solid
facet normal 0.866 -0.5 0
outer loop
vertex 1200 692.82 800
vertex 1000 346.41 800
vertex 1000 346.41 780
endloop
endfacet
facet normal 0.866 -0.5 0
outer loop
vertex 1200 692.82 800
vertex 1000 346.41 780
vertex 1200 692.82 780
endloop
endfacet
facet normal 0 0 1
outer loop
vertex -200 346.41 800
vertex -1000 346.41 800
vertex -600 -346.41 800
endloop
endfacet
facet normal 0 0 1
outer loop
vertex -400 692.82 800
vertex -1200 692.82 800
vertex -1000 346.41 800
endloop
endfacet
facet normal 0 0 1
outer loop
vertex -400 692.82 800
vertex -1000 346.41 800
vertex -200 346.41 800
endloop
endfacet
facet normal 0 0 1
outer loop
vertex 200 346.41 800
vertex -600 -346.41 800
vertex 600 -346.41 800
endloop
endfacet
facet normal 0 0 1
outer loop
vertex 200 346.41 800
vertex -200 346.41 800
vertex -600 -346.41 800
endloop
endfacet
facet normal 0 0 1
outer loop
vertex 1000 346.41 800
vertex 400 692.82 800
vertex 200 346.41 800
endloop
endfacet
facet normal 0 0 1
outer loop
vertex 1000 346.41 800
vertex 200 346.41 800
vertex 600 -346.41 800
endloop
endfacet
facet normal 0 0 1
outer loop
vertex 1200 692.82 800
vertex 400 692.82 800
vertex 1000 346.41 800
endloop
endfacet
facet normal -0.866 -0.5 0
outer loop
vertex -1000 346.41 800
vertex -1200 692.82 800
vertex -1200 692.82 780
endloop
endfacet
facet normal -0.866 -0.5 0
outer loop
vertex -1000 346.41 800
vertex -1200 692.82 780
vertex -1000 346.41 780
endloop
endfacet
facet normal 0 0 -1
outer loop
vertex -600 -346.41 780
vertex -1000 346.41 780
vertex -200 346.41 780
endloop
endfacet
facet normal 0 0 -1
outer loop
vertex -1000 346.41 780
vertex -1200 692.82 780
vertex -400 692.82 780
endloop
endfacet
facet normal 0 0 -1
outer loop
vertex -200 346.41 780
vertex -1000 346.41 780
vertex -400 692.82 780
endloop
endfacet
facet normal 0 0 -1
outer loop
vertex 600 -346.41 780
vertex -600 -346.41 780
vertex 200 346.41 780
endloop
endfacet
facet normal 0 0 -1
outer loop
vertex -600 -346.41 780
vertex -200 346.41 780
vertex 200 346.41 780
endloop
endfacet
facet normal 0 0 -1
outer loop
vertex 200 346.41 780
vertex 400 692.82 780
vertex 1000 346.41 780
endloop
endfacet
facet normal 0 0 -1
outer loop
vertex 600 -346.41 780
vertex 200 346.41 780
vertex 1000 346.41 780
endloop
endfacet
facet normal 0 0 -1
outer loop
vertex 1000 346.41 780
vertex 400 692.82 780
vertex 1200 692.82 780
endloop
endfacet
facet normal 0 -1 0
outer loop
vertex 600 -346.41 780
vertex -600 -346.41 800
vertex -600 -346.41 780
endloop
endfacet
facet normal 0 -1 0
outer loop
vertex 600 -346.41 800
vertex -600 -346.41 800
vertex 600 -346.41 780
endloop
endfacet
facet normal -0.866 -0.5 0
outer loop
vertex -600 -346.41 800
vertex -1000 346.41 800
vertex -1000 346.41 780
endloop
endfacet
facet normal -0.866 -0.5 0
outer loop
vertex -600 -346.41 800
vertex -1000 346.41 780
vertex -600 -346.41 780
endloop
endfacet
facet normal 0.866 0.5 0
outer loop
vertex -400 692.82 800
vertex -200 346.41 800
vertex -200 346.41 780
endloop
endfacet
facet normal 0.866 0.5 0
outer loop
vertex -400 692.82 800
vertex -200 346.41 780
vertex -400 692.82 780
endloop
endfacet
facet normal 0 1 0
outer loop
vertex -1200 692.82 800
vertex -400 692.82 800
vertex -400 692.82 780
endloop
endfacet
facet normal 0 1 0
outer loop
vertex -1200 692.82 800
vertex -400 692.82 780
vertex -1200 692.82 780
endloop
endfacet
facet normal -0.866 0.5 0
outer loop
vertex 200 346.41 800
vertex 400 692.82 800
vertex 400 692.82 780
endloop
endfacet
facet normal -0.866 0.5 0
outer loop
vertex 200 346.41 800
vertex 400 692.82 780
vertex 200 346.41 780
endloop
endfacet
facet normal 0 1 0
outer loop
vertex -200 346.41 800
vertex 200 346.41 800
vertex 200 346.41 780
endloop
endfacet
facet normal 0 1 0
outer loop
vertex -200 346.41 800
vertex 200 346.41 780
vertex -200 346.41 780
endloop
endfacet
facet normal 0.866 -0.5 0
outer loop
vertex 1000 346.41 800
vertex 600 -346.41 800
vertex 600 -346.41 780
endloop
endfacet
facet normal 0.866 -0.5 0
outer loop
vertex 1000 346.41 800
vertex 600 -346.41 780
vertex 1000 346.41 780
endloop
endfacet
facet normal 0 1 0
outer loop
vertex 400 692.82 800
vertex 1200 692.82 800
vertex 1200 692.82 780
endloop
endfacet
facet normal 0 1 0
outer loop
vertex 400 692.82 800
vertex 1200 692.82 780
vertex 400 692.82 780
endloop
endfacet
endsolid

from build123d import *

# Parameters (mm, degrees)
F2_DEPTH = 20


with BuildPart() as f2:
    # F1 (on offset) → F2 (new body)
    with BuildSketch(Plane.XY.offset(800)):
        Polygon((-200, 346.410162), (0, 0), (200, 346.410162), align=None)
        Polygon((-1000, 346.410162), (-600, 346.410162), (-800, 692.820323), align=None)
        Polygon((200, 346.410162), (0, 0), (400, 0), align=None)
        Polygon((-200, -346.410162), (0, 0), (-400, 0), align=None)
        Polygon((-800, 0), (-600, 346.410162), (-1000, 346.410162), align=None)
        Polygon((1200, 692.820323), (800, 692.820323), (1000, 346.410162), align=None)
        Polygon((-400, 0), (0, 0), (-200, 346.410162), align=None)
        Polygon((-1000, 346.410162), (-800, 692.820323), (-1200, 692.820323), align=None)
        Polygon((400, 692.820323), (200, 346.410162), (600, 346.410162), align=None)
        Polygon((800, 692.820323), (400, 692.820323), (600, 346.410162), align=None)
        Polygon((1000, 346.410162), (600, 346.410162), (800, 0), align=None)
        Polygon((400, 0), (0, 0), (200, -346.410162), align=None)
        Polygon((200, -346.410162), (0, 0), (-200, -346.410162), align=None)
        Polygon((800, 0), (400, 0), (600, -346.410162), align=None)
        Polygon((600, -346.410162), (400, 0), (200, -346.410162), align=None)
        Polygon((-800, 692.820323), (-600, 346.410162), (-400, 692.820323), align=None)
        Polygon((-600, -346.410162), (-200, -346.410162), (-400, 0), align=None)
        Polygon((-600, -346.410162), (-400, 0), (-800, 0), align=None)
        Polygon((-600, 346.410162), (-200, 346.410162), (-400, 692.820323), align=None)
        Polygon((-400, 0), (-200, 346.410162), (-600, 346.410162), align=None)
        Polygon((600, 346.410162), (200, 346.410162), (400, 0), align=None)
        Polygon((800, 692.820323), (600, 346.410162), (1000, 346.410162), align=None)
        Polygon((-800, 0), (-400, 0), (-600, 346.410162), align=None)
        Polygon((600, 346.410162), (400, 0), (800, 0), align=None)
    extrude(amount=-F2_DEPTH)


solid = f2.part
